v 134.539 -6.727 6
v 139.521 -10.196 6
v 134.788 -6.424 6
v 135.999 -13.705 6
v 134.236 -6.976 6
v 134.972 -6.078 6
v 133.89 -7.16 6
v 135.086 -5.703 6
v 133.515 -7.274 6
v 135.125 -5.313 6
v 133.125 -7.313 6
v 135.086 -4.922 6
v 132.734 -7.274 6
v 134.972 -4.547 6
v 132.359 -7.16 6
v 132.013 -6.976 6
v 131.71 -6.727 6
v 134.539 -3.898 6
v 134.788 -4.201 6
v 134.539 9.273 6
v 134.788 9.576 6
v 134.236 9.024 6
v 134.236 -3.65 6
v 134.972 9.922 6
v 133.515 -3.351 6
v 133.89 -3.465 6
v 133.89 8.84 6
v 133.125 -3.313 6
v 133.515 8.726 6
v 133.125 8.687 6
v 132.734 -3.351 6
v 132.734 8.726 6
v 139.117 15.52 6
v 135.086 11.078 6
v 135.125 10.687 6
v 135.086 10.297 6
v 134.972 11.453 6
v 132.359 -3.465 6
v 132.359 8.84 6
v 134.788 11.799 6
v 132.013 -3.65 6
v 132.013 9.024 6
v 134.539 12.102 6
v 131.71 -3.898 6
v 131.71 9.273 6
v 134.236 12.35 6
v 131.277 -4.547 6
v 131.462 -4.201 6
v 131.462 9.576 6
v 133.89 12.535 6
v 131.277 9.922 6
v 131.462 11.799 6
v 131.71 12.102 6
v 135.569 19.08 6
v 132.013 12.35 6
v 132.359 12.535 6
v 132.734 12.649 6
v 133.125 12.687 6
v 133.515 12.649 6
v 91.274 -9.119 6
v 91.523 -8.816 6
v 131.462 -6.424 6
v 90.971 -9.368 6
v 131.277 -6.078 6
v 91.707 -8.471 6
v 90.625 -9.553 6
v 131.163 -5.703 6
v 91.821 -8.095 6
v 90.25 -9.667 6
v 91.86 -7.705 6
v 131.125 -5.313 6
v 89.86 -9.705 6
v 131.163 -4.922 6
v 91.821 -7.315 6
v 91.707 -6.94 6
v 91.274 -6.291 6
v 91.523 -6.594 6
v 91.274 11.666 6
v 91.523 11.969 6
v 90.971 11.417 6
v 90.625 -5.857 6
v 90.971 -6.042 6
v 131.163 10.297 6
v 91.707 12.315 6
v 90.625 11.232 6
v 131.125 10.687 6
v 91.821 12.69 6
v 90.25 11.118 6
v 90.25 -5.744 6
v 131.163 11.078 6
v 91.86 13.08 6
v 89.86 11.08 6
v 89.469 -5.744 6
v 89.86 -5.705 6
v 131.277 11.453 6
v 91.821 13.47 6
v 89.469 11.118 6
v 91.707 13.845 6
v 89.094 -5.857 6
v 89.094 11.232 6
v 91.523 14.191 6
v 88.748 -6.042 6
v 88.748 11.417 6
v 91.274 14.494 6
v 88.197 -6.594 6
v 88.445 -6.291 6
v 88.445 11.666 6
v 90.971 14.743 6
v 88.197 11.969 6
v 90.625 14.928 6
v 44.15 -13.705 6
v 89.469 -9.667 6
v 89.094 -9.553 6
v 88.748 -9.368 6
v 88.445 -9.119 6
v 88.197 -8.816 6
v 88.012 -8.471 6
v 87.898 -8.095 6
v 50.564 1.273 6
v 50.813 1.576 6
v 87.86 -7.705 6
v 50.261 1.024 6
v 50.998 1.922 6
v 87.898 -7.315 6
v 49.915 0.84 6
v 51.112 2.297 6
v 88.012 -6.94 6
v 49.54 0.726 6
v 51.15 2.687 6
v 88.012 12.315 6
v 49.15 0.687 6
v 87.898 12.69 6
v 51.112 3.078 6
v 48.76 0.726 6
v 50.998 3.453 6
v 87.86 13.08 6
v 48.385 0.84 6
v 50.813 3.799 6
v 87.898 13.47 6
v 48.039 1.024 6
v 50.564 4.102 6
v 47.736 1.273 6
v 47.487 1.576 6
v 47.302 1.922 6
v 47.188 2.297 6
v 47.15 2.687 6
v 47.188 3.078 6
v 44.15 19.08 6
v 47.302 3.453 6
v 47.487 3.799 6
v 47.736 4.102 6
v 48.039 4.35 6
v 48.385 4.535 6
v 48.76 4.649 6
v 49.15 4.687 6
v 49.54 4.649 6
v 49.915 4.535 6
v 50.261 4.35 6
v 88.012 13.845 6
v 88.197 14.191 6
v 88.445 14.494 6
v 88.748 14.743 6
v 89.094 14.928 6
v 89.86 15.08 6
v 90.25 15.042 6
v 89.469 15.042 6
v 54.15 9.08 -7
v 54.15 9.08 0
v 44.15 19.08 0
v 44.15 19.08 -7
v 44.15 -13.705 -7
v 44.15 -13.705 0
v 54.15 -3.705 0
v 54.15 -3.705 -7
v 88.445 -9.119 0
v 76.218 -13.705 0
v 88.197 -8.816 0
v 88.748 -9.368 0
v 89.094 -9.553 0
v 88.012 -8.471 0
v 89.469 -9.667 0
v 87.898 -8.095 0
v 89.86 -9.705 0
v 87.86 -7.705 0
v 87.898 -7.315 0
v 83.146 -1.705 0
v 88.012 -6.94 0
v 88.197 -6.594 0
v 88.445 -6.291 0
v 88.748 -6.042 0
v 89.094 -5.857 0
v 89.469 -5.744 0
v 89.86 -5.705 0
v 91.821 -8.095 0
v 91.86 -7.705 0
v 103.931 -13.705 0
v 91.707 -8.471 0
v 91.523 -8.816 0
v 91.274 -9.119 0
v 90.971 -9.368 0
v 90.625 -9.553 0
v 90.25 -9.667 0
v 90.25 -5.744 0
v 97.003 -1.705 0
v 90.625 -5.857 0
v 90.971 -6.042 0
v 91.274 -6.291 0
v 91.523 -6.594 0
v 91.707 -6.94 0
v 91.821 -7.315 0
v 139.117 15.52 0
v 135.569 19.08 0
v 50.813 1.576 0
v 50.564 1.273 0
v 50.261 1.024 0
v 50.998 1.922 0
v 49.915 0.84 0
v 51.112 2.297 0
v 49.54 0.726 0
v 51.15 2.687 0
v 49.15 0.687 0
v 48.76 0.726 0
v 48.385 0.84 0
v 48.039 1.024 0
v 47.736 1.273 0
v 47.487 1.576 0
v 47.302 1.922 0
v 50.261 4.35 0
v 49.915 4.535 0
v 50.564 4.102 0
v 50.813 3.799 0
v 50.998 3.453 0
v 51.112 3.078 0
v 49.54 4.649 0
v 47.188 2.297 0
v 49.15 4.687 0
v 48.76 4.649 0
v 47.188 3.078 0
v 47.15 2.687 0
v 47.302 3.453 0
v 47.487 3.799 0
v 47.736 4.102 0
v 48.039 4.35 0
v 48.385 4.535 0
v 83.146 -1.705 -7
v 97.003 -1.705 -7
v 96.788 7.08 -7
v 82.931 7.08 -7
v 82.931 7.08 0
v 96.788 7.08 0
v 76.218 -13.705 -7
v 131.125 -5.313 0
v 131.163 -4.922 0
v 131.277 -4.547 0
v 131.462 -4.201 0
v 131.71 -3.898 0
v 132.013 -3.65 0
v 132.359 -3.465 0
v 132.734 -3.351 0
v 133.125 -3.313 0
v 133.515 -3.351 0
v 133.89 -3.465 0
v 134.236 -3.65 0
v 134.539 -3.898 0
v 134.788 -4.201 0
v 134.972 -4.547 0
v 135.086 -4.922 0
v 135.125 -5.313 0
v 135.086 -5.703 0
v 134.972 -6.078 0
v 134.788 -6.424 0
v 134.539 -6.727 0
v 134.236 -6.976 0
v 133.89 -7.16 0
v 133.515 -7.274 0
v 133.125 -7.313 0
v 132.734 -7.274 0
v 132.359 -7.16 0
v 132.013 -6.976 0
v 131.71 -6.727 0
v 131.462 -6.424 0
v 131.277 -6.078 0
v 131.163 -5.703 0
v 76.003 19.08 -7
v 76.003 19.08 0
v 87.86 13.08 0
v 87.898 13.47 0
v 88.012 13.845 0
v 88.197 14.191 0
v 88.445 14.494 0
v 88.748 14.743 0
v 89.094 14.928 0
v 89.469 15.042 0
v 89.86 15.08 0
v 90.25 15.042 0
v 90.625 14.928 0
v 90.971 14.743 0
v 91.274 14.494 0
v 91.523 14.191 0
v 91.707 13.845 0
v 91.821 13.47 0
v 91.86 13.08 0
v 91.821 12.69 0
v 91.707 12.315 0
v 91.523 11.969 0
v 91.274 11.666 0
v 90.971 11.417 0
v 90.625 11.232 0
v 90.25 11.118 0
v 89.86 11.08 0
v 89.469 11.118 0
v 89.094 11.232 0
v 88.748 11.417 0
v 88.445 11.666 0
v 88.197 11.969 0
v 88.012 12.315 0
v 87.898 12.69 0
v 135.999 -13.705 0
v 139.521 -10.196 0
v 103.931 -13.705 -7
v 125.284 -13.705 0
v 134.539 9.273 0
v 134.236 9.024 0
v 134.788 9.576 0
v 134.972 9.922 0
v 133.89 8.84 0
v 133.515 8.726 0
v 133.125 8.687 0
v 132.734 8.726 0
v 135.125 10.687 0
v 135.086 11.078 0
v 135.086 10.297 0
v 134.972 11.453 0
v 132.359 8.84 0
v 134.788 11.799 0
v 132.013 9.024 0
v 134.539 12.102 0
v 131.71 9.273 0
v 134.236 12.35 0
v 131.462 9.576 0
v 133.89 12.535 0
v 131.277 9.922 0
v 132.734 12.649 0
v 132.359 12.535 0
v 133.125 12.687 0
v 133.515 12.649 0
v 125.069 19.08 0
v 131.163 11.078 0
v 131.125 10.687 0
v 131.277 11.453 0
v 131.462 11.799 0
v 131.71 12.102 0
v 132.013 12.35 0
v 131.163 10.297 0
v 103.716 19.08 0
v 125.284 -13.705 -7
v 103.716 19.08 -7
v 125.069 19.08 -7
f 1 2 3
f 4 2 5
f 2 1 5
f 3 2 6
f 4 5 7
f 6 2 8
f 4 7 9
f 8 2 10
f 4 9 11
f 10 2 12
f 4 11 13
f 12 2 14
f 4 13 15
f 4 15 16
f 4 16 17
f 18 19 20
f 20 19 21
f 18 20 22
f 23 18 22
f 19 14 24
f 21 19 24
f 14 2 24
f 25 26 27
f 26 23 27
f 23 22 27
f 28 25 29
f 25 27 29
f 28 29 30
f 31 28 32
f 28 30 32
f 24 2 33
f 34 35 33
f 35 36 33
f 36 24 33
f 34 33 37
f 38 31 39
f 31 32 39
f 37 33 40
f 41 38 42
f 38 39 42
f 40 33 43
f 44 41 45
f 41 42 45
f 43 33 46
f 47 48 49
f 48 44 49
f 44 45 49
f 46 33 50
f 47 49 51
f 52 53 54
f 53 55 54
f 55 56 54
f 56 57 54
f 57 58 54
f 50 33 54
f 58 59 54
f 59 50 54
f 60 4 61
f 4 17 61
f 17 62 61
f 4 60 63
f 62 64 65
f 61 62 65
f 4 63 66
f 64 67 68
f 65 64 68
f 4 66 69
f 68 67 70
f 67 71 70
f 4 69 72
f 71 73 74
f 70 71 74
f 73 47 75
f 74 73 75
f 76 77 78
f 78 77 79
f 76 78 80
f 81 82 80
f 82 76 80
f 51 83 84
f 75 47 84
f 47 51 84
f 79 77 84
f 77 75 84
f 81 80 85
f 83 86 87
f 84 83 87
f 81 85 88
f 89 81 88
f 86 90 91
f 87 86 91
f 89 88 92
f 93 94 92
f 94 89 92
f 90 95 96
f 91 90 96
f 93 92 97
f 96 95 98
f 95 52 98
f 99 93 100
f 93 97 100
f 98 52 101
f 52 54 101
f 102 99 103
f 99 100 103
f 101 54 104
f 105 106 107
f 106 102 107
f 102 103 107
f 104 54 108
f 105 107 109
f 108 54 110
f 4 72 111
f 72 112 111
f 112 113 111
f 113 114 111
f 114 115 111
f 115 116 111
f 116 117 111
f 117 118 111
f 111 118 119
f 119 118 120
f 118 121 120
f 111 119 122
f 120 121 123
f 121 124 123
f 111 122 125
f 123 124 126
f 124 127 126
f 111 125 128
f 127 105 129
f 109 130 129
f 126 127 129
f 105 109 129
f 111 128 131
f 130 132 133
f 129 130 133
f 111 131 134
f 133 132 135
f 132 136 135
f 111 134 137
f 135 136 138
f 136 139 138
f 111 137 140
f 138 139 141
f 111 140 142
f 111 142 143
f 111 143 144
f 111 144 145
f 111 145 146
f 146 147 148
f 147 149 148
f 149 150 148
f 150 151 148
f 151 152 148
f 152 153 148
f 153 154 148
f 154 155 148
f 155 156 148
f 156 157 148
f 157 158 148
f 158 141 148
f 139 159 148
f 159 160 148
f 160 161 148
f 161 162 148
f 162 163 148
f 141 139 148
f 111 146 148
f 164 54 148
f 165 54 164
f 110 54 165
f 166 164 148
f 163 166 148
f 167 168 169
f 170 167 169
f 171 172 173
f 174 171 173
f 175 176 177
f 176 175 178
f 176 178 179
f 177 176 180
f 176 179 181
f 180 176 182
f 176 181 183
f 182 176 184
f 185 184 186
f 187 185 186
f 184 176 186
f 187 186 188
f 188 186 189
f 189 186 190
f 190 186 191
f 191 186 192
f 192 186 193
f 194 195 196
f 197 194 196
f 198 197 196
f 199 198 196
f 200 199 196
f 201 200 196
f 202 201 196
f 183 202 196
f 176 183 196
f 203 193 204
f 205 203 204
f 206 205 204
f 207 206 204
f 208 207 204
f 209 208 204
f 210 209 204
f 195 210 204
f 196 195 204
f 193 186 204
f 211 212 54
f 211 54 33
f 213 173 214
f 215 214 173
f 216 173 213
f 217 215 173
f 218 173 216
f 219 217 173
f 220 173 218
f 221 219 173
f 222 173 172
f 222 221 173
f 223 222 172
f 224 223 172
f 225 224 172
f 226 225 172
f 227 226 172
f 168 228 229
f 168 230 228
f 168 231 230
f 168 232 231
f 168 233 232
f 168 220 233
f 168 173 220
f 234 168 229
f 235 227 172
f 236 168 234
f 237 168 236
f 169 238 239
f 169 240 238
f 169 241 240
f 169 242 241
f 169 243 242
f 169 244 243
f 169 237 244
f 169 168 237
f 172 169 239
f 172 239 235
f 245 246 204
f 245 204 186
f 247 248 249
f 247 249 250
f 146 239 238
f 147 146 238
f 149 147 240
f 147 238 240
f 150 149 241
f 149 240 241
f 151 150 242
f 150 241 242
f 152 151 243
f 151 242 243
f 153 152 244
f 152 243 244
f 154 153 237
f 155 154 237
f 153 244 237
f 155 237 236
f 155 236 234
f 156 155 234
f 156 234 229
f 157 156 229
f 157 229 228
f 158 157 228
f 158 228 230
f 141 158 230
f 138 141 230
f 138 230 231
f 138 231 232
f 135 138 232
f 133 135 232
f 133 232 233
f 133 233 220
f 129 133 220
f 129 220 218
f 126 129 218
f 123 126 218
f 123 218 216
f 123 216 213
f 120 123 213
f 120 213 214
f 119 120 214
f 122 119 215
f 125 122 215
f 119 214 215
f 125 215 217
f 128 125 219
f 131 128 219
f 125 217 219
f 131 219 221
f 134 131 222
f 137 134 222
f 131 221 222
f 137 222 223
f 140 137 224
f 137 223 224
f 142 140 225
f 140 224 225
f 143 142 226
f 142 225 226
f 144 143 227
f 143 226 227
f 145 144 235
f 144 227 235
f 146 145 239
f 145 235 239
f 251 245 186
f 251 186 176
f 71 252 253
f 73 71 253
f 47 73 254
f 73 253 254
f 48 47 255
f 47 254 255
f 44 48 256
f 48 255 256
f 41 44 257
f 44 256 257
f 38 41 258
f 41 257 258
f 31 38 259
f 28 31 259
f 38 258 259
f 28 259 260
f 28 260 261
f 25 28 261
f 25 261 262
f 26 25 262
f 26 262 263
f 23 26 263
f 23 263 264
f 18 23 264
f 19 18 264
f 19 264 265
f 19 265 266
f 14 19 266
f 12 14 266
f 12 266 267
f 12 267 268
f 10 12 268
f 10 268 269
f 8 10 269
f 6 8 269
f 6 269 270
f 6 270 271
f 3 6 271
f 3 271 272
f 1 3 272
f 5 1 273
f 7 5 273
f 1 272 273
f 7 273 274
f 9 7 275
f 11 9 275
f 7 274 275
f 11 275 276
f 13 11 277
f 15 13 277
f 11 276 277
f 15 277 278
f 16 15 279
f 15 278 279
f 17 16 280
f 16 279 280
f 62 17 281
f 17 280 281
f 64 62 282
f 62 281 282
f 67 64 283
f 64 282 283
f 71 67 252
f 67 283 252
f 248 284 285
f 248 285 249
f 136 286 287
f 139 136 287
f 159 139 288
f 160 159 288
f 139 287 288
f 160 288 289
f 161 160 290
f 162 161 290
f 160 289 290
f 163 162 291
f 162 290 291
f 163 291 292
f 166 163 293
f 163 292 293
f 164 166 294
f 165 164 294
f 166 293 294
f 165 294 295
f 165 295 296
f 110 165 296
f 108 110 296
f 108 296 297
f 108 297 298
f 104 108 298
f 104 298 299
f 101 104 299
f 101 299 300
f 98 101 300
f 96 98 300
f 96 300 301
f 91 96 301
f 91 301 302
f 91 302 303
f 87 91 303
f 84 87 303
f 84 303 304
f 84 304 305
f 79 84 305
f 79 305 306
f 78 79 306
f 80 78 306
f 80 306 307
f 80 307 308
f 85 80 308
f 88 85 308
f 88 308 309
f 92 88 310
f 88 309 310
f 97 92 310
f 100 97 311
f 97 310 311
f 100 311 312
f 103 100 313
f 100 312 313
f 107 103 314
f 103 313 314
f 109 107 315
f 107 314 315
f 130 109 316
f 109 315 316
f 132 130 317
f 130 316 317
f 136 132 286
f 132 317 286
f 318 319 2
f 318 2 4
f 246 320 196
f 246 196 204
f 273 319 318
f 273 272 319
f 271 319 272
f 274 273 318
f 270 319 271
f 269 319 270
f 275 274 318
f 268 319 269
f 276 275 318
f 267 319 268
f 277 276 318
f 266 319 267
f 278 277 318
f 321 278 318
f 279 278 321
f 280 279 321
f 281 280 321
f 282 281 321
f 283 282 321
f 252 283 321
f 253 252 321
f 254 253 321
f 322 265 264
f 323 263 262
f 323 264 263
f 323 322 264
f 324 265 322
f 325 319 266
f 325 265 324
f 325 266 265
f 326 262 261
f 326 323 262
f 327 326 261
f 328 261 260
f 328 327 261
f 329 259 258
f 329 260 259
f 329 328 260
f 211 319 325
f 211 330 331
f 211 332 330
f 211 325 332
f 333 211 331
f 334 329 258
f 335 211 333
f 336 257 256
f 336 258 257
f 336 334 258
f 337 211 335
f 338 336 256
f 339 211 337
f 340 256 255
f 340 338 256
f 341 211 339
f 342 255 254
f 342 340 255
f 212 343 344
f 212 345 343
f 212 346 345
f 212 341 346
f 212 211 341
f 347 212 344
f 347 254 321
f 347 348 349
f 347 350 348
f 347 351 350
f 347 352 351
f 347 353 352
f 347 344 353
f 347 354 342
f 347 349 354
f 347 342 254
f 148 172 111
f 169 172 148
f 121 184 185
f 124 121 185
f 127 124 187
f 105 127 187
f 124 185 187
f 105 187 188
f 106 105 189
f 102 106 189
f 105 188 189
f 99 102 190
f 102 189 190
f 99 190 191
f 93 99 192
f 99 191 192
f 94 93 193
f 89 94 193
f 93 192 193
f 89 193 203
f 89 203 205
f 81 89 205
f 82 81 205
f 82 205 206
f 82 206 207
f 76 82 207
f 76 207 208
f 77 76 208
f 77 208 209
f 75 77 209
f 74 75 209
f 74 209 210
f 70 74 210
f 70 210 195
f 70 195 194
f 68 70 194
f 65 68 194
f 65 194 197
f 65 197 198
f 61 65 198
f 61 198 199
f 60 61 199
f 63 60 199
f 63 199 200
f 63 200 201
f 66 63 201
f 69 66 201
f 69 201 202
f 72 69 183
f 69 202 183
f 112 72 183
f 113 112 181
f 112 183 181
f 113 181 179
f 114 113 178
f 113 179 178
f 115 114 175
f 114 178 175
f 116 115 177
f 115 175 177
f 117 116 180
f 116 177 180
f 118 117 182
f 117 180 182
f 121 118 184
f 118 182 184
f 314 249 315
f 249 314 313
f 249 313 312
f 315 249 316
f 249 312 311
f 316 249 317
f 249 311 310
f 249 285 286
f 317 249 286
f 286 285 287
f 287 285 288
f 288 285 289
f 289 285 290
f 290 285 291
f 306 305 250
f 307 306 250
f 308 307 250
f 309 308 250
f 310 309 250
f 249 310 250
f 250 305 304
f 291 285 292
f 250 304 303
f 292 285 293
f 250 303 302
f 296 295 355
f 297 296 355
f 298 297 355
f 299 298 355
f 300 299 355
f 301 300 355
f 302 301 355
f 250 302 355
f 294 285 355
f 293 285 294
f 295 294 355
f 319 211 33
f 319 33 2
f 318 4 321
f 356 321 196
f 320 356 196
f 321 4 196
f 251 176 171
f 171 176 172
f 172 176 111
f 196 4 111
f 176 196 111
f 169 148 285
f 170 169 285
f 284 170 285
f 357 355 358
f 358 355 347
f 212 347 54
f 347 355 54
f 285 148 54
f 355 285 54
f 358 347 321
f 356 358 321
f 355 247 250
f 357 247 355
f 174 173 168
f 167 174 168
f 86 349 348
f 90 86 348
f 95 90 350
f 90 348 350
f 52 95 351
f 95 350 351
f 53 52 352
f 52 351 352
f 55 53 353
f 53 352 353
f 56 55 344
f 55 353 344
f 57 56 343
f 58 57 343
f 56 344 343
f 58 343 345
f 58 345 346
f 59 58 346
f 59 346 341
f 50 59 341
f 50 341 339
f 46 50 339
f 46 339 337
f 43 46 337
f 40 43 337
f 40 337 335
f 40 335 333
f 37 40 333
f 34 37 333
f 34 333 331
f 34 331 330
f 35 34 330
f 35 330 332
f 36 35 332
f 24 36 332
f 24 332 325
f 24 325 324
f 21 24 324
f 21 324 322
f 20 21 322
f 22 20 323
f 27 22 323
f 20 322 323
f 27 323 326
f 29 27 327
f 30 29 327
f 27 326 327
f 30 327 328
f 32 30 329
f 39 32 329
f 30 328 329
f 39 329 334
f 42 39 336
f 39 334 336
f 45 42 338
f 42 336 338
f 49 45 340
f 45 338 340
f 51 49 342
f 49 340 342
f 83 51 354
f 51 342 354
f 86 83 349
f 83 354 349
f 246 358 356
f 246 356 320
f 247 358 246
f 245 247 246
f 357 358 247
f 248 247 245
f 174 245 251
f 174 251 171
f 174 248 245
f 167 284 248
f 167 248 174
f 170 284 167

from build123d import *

# Parameters (mm, degrees)
BOSS_EXTRUDE1_DEPTH = 6
BOSS_EXTRUDE2_DEPTH = 7
CUT_EXTRUDE1_REACH  = 143.419
SKETCH3_R           = 2
CUT_EXTRUDE2_START  = -13
CUT_EXTRUDE2_DEPTH  = 7
CUT_EXTRUDE3_REACH  = 142.994
SKETCH5_R           = 2


with BuildPart() as part:
    # Sketch1 → Boss-Extrude1 (new body)
    with BuildSketch(Plane.XY):
        Polygon((44.15, 19.080039823), (135.5692396, 19.080039823), (139.116658887, 15.519822908), (139.521129618, -10.195951693), (135.999179687, -13.705241552), (44.15, -13.705241552), align=None)
    extrude(amount=BOSS_EXTRUDE1_DEPTH)

    # Sketch2 → Boss-Extrude2 (add)
    with BuildSketch(Plane(origin=(0, 0, 0), x_dir=(-1, 0, 0), z_dir=(0, 0, -1))):
        Polygon((-125.069457212, 19.080039823), (-125.284105894, -13.705241552), (-44.15, -13.705241552), (-54.15, -3.705241552), (-54.15, 9.080039823), (-44.15, 19.080039823), align=None)
    extrude(amount=BOSS_EXTRUDE2_DEPTH)

    # Sketch3 → Cut-Extrude1 (cut, up to next)
    with BuildSketch(Plane(origin=(0, 0, -7), x_dir=(-1, 0, 0), z_dir=(0, 0, -1)), mode=Mode.PRIVATE) as cut_extrude1_sk1:
        with Locations((-133.124576169, 10.687399136)):
            Circle(SKETCH3_R)
    cut_extrude1_tool1 = extrude(cut_extrude1_sk1.sketch, amount=-CUT_EXTRUDE1_REACH, mode=Mode.PRIVATE) & part.part
    # Sketch3 → Cut-Extrude1 (cut, up to next)
    with BuildSketch(Plane(origin=(0, 0, -7), x_dir=(-1, 0, 0), z_dir=(0, 0, -1)), mode=Mode.PRIVATE) as cut_extrude1_sk2:
        with Locations((-133.124576169, -5.312600864)):
            Circle(SKETCH3_R)
    cut_extrude1_tool2 = extrude(cut_extrude1_sk2.sketch, amount=-CUT_EXTRUDE1_REACH, mode=Mode.PRIVATE) & part.part
    # Sketch3 → Cut-Extrude1 (cut, up to next)
    with BuildSketch(Plane(origin=(0, 0, -7), x_dir=(-1, 0, 0), z_dir=(0, 0, -1)), mode=Mode.PRIVATE) as cut_extrude1_sk3:
        with Locations((-49.15, 2.687399136)):
            Circle(SKETCH3_R)
    cut_extrude1_tool3 = extrude(cut_extrude1_sk3.sketch, amount=-CUT_EXTRUDE1_REACH, mode=Mode.PRIVATE) & part.part
    add(cut_extrude1_tool1.solids().sort_by_distance((133.124576, 10.687399, -7))[0], mode=Mode.SUBTRACT)
    add(cut_extrude1_tool2.solids().sort_by_distance((133.124576, -5.312601, -7))[0], mode=Mode.SUBTRACT)
    add(cut_extrude1_tool3.solids().sort_by_distance((49.15, 2.687399, -7))[0], mode=Mode.SUBTRACT)

    # Sketch4 → Cut-Extrude2 (cut)
    with BuildSketch(Plane.XY.offset(6).offset(CUT_EXTRUDE2_START)):
        Polygon((76.218183383, -13.705241552), (83.146386613, -25.705241552), (97.002793074, -25.705241552), (103.930996304, -13.705241552), (97.002793074, -1.705241552), (83.146386613, -1.705241552), align=None)
        Polygon((76.003213339, 19.080039823), (82.93141657, 7.080039823), (96.78782303, 7.080039823), (103.71602626, 19.080039823), (96.78782303, 31.080039823), (82.93141657, 31.080039823), align=None)
    extrude(amount=CUT_EXTRUDE2_DEPTH, mode=Mode.SUBTRACT)

    # Sketch5 → Cut-Extrude3 (cut, up to next)
    with BuildSketch(Plane(origin=(0, 0, 0), x_dir=(-1, 0, 0), z_dir=(0, 0, -1)), mode=Mode.PRIVATE) as cut_extrude3_sk1:
        with Locations((-89.8596198, 13.080039823)):
            Circle(SKETCH5_R)
    cut_extrude3_tool1 = extrude(cut_extrude3_sk1.sketch, amount=-CUT_EXTRUDE3_REACH, mode=Mode.PRIVATE) & part.part
    # Sketch5 → Cut-Extrude3 (cut, up to next)
    with BuildSketch(Plane(origin=(0, 0, 0), x_dir=(-1, 0, 0), z_dir=(0, 0, -1)), mode=Mode.PRIVATE) as cut_extrude3_sk2:
        with Locations((-89.8596198, -7.705241552)):
            Circle(SKETCH5_R)
    cut_extrude3_tool2 = extrude(cut_extrude3_sk2.sketch, amount=-CUT_EXTRUDE3_REACH, mode=Mode.PRIVATE) & part.part
    add(cut_extrude3_tool1.solids().sort_by_distance((89.85962, 13.08004, 0))[0], mode=Mode.SUBTRACT)
    add(cut_extrude3_tool2.solids().sort_by_distance((89.85962, -7.705242, 0))[0], mode=Mode.SUBTRACT)


solid = part.part
